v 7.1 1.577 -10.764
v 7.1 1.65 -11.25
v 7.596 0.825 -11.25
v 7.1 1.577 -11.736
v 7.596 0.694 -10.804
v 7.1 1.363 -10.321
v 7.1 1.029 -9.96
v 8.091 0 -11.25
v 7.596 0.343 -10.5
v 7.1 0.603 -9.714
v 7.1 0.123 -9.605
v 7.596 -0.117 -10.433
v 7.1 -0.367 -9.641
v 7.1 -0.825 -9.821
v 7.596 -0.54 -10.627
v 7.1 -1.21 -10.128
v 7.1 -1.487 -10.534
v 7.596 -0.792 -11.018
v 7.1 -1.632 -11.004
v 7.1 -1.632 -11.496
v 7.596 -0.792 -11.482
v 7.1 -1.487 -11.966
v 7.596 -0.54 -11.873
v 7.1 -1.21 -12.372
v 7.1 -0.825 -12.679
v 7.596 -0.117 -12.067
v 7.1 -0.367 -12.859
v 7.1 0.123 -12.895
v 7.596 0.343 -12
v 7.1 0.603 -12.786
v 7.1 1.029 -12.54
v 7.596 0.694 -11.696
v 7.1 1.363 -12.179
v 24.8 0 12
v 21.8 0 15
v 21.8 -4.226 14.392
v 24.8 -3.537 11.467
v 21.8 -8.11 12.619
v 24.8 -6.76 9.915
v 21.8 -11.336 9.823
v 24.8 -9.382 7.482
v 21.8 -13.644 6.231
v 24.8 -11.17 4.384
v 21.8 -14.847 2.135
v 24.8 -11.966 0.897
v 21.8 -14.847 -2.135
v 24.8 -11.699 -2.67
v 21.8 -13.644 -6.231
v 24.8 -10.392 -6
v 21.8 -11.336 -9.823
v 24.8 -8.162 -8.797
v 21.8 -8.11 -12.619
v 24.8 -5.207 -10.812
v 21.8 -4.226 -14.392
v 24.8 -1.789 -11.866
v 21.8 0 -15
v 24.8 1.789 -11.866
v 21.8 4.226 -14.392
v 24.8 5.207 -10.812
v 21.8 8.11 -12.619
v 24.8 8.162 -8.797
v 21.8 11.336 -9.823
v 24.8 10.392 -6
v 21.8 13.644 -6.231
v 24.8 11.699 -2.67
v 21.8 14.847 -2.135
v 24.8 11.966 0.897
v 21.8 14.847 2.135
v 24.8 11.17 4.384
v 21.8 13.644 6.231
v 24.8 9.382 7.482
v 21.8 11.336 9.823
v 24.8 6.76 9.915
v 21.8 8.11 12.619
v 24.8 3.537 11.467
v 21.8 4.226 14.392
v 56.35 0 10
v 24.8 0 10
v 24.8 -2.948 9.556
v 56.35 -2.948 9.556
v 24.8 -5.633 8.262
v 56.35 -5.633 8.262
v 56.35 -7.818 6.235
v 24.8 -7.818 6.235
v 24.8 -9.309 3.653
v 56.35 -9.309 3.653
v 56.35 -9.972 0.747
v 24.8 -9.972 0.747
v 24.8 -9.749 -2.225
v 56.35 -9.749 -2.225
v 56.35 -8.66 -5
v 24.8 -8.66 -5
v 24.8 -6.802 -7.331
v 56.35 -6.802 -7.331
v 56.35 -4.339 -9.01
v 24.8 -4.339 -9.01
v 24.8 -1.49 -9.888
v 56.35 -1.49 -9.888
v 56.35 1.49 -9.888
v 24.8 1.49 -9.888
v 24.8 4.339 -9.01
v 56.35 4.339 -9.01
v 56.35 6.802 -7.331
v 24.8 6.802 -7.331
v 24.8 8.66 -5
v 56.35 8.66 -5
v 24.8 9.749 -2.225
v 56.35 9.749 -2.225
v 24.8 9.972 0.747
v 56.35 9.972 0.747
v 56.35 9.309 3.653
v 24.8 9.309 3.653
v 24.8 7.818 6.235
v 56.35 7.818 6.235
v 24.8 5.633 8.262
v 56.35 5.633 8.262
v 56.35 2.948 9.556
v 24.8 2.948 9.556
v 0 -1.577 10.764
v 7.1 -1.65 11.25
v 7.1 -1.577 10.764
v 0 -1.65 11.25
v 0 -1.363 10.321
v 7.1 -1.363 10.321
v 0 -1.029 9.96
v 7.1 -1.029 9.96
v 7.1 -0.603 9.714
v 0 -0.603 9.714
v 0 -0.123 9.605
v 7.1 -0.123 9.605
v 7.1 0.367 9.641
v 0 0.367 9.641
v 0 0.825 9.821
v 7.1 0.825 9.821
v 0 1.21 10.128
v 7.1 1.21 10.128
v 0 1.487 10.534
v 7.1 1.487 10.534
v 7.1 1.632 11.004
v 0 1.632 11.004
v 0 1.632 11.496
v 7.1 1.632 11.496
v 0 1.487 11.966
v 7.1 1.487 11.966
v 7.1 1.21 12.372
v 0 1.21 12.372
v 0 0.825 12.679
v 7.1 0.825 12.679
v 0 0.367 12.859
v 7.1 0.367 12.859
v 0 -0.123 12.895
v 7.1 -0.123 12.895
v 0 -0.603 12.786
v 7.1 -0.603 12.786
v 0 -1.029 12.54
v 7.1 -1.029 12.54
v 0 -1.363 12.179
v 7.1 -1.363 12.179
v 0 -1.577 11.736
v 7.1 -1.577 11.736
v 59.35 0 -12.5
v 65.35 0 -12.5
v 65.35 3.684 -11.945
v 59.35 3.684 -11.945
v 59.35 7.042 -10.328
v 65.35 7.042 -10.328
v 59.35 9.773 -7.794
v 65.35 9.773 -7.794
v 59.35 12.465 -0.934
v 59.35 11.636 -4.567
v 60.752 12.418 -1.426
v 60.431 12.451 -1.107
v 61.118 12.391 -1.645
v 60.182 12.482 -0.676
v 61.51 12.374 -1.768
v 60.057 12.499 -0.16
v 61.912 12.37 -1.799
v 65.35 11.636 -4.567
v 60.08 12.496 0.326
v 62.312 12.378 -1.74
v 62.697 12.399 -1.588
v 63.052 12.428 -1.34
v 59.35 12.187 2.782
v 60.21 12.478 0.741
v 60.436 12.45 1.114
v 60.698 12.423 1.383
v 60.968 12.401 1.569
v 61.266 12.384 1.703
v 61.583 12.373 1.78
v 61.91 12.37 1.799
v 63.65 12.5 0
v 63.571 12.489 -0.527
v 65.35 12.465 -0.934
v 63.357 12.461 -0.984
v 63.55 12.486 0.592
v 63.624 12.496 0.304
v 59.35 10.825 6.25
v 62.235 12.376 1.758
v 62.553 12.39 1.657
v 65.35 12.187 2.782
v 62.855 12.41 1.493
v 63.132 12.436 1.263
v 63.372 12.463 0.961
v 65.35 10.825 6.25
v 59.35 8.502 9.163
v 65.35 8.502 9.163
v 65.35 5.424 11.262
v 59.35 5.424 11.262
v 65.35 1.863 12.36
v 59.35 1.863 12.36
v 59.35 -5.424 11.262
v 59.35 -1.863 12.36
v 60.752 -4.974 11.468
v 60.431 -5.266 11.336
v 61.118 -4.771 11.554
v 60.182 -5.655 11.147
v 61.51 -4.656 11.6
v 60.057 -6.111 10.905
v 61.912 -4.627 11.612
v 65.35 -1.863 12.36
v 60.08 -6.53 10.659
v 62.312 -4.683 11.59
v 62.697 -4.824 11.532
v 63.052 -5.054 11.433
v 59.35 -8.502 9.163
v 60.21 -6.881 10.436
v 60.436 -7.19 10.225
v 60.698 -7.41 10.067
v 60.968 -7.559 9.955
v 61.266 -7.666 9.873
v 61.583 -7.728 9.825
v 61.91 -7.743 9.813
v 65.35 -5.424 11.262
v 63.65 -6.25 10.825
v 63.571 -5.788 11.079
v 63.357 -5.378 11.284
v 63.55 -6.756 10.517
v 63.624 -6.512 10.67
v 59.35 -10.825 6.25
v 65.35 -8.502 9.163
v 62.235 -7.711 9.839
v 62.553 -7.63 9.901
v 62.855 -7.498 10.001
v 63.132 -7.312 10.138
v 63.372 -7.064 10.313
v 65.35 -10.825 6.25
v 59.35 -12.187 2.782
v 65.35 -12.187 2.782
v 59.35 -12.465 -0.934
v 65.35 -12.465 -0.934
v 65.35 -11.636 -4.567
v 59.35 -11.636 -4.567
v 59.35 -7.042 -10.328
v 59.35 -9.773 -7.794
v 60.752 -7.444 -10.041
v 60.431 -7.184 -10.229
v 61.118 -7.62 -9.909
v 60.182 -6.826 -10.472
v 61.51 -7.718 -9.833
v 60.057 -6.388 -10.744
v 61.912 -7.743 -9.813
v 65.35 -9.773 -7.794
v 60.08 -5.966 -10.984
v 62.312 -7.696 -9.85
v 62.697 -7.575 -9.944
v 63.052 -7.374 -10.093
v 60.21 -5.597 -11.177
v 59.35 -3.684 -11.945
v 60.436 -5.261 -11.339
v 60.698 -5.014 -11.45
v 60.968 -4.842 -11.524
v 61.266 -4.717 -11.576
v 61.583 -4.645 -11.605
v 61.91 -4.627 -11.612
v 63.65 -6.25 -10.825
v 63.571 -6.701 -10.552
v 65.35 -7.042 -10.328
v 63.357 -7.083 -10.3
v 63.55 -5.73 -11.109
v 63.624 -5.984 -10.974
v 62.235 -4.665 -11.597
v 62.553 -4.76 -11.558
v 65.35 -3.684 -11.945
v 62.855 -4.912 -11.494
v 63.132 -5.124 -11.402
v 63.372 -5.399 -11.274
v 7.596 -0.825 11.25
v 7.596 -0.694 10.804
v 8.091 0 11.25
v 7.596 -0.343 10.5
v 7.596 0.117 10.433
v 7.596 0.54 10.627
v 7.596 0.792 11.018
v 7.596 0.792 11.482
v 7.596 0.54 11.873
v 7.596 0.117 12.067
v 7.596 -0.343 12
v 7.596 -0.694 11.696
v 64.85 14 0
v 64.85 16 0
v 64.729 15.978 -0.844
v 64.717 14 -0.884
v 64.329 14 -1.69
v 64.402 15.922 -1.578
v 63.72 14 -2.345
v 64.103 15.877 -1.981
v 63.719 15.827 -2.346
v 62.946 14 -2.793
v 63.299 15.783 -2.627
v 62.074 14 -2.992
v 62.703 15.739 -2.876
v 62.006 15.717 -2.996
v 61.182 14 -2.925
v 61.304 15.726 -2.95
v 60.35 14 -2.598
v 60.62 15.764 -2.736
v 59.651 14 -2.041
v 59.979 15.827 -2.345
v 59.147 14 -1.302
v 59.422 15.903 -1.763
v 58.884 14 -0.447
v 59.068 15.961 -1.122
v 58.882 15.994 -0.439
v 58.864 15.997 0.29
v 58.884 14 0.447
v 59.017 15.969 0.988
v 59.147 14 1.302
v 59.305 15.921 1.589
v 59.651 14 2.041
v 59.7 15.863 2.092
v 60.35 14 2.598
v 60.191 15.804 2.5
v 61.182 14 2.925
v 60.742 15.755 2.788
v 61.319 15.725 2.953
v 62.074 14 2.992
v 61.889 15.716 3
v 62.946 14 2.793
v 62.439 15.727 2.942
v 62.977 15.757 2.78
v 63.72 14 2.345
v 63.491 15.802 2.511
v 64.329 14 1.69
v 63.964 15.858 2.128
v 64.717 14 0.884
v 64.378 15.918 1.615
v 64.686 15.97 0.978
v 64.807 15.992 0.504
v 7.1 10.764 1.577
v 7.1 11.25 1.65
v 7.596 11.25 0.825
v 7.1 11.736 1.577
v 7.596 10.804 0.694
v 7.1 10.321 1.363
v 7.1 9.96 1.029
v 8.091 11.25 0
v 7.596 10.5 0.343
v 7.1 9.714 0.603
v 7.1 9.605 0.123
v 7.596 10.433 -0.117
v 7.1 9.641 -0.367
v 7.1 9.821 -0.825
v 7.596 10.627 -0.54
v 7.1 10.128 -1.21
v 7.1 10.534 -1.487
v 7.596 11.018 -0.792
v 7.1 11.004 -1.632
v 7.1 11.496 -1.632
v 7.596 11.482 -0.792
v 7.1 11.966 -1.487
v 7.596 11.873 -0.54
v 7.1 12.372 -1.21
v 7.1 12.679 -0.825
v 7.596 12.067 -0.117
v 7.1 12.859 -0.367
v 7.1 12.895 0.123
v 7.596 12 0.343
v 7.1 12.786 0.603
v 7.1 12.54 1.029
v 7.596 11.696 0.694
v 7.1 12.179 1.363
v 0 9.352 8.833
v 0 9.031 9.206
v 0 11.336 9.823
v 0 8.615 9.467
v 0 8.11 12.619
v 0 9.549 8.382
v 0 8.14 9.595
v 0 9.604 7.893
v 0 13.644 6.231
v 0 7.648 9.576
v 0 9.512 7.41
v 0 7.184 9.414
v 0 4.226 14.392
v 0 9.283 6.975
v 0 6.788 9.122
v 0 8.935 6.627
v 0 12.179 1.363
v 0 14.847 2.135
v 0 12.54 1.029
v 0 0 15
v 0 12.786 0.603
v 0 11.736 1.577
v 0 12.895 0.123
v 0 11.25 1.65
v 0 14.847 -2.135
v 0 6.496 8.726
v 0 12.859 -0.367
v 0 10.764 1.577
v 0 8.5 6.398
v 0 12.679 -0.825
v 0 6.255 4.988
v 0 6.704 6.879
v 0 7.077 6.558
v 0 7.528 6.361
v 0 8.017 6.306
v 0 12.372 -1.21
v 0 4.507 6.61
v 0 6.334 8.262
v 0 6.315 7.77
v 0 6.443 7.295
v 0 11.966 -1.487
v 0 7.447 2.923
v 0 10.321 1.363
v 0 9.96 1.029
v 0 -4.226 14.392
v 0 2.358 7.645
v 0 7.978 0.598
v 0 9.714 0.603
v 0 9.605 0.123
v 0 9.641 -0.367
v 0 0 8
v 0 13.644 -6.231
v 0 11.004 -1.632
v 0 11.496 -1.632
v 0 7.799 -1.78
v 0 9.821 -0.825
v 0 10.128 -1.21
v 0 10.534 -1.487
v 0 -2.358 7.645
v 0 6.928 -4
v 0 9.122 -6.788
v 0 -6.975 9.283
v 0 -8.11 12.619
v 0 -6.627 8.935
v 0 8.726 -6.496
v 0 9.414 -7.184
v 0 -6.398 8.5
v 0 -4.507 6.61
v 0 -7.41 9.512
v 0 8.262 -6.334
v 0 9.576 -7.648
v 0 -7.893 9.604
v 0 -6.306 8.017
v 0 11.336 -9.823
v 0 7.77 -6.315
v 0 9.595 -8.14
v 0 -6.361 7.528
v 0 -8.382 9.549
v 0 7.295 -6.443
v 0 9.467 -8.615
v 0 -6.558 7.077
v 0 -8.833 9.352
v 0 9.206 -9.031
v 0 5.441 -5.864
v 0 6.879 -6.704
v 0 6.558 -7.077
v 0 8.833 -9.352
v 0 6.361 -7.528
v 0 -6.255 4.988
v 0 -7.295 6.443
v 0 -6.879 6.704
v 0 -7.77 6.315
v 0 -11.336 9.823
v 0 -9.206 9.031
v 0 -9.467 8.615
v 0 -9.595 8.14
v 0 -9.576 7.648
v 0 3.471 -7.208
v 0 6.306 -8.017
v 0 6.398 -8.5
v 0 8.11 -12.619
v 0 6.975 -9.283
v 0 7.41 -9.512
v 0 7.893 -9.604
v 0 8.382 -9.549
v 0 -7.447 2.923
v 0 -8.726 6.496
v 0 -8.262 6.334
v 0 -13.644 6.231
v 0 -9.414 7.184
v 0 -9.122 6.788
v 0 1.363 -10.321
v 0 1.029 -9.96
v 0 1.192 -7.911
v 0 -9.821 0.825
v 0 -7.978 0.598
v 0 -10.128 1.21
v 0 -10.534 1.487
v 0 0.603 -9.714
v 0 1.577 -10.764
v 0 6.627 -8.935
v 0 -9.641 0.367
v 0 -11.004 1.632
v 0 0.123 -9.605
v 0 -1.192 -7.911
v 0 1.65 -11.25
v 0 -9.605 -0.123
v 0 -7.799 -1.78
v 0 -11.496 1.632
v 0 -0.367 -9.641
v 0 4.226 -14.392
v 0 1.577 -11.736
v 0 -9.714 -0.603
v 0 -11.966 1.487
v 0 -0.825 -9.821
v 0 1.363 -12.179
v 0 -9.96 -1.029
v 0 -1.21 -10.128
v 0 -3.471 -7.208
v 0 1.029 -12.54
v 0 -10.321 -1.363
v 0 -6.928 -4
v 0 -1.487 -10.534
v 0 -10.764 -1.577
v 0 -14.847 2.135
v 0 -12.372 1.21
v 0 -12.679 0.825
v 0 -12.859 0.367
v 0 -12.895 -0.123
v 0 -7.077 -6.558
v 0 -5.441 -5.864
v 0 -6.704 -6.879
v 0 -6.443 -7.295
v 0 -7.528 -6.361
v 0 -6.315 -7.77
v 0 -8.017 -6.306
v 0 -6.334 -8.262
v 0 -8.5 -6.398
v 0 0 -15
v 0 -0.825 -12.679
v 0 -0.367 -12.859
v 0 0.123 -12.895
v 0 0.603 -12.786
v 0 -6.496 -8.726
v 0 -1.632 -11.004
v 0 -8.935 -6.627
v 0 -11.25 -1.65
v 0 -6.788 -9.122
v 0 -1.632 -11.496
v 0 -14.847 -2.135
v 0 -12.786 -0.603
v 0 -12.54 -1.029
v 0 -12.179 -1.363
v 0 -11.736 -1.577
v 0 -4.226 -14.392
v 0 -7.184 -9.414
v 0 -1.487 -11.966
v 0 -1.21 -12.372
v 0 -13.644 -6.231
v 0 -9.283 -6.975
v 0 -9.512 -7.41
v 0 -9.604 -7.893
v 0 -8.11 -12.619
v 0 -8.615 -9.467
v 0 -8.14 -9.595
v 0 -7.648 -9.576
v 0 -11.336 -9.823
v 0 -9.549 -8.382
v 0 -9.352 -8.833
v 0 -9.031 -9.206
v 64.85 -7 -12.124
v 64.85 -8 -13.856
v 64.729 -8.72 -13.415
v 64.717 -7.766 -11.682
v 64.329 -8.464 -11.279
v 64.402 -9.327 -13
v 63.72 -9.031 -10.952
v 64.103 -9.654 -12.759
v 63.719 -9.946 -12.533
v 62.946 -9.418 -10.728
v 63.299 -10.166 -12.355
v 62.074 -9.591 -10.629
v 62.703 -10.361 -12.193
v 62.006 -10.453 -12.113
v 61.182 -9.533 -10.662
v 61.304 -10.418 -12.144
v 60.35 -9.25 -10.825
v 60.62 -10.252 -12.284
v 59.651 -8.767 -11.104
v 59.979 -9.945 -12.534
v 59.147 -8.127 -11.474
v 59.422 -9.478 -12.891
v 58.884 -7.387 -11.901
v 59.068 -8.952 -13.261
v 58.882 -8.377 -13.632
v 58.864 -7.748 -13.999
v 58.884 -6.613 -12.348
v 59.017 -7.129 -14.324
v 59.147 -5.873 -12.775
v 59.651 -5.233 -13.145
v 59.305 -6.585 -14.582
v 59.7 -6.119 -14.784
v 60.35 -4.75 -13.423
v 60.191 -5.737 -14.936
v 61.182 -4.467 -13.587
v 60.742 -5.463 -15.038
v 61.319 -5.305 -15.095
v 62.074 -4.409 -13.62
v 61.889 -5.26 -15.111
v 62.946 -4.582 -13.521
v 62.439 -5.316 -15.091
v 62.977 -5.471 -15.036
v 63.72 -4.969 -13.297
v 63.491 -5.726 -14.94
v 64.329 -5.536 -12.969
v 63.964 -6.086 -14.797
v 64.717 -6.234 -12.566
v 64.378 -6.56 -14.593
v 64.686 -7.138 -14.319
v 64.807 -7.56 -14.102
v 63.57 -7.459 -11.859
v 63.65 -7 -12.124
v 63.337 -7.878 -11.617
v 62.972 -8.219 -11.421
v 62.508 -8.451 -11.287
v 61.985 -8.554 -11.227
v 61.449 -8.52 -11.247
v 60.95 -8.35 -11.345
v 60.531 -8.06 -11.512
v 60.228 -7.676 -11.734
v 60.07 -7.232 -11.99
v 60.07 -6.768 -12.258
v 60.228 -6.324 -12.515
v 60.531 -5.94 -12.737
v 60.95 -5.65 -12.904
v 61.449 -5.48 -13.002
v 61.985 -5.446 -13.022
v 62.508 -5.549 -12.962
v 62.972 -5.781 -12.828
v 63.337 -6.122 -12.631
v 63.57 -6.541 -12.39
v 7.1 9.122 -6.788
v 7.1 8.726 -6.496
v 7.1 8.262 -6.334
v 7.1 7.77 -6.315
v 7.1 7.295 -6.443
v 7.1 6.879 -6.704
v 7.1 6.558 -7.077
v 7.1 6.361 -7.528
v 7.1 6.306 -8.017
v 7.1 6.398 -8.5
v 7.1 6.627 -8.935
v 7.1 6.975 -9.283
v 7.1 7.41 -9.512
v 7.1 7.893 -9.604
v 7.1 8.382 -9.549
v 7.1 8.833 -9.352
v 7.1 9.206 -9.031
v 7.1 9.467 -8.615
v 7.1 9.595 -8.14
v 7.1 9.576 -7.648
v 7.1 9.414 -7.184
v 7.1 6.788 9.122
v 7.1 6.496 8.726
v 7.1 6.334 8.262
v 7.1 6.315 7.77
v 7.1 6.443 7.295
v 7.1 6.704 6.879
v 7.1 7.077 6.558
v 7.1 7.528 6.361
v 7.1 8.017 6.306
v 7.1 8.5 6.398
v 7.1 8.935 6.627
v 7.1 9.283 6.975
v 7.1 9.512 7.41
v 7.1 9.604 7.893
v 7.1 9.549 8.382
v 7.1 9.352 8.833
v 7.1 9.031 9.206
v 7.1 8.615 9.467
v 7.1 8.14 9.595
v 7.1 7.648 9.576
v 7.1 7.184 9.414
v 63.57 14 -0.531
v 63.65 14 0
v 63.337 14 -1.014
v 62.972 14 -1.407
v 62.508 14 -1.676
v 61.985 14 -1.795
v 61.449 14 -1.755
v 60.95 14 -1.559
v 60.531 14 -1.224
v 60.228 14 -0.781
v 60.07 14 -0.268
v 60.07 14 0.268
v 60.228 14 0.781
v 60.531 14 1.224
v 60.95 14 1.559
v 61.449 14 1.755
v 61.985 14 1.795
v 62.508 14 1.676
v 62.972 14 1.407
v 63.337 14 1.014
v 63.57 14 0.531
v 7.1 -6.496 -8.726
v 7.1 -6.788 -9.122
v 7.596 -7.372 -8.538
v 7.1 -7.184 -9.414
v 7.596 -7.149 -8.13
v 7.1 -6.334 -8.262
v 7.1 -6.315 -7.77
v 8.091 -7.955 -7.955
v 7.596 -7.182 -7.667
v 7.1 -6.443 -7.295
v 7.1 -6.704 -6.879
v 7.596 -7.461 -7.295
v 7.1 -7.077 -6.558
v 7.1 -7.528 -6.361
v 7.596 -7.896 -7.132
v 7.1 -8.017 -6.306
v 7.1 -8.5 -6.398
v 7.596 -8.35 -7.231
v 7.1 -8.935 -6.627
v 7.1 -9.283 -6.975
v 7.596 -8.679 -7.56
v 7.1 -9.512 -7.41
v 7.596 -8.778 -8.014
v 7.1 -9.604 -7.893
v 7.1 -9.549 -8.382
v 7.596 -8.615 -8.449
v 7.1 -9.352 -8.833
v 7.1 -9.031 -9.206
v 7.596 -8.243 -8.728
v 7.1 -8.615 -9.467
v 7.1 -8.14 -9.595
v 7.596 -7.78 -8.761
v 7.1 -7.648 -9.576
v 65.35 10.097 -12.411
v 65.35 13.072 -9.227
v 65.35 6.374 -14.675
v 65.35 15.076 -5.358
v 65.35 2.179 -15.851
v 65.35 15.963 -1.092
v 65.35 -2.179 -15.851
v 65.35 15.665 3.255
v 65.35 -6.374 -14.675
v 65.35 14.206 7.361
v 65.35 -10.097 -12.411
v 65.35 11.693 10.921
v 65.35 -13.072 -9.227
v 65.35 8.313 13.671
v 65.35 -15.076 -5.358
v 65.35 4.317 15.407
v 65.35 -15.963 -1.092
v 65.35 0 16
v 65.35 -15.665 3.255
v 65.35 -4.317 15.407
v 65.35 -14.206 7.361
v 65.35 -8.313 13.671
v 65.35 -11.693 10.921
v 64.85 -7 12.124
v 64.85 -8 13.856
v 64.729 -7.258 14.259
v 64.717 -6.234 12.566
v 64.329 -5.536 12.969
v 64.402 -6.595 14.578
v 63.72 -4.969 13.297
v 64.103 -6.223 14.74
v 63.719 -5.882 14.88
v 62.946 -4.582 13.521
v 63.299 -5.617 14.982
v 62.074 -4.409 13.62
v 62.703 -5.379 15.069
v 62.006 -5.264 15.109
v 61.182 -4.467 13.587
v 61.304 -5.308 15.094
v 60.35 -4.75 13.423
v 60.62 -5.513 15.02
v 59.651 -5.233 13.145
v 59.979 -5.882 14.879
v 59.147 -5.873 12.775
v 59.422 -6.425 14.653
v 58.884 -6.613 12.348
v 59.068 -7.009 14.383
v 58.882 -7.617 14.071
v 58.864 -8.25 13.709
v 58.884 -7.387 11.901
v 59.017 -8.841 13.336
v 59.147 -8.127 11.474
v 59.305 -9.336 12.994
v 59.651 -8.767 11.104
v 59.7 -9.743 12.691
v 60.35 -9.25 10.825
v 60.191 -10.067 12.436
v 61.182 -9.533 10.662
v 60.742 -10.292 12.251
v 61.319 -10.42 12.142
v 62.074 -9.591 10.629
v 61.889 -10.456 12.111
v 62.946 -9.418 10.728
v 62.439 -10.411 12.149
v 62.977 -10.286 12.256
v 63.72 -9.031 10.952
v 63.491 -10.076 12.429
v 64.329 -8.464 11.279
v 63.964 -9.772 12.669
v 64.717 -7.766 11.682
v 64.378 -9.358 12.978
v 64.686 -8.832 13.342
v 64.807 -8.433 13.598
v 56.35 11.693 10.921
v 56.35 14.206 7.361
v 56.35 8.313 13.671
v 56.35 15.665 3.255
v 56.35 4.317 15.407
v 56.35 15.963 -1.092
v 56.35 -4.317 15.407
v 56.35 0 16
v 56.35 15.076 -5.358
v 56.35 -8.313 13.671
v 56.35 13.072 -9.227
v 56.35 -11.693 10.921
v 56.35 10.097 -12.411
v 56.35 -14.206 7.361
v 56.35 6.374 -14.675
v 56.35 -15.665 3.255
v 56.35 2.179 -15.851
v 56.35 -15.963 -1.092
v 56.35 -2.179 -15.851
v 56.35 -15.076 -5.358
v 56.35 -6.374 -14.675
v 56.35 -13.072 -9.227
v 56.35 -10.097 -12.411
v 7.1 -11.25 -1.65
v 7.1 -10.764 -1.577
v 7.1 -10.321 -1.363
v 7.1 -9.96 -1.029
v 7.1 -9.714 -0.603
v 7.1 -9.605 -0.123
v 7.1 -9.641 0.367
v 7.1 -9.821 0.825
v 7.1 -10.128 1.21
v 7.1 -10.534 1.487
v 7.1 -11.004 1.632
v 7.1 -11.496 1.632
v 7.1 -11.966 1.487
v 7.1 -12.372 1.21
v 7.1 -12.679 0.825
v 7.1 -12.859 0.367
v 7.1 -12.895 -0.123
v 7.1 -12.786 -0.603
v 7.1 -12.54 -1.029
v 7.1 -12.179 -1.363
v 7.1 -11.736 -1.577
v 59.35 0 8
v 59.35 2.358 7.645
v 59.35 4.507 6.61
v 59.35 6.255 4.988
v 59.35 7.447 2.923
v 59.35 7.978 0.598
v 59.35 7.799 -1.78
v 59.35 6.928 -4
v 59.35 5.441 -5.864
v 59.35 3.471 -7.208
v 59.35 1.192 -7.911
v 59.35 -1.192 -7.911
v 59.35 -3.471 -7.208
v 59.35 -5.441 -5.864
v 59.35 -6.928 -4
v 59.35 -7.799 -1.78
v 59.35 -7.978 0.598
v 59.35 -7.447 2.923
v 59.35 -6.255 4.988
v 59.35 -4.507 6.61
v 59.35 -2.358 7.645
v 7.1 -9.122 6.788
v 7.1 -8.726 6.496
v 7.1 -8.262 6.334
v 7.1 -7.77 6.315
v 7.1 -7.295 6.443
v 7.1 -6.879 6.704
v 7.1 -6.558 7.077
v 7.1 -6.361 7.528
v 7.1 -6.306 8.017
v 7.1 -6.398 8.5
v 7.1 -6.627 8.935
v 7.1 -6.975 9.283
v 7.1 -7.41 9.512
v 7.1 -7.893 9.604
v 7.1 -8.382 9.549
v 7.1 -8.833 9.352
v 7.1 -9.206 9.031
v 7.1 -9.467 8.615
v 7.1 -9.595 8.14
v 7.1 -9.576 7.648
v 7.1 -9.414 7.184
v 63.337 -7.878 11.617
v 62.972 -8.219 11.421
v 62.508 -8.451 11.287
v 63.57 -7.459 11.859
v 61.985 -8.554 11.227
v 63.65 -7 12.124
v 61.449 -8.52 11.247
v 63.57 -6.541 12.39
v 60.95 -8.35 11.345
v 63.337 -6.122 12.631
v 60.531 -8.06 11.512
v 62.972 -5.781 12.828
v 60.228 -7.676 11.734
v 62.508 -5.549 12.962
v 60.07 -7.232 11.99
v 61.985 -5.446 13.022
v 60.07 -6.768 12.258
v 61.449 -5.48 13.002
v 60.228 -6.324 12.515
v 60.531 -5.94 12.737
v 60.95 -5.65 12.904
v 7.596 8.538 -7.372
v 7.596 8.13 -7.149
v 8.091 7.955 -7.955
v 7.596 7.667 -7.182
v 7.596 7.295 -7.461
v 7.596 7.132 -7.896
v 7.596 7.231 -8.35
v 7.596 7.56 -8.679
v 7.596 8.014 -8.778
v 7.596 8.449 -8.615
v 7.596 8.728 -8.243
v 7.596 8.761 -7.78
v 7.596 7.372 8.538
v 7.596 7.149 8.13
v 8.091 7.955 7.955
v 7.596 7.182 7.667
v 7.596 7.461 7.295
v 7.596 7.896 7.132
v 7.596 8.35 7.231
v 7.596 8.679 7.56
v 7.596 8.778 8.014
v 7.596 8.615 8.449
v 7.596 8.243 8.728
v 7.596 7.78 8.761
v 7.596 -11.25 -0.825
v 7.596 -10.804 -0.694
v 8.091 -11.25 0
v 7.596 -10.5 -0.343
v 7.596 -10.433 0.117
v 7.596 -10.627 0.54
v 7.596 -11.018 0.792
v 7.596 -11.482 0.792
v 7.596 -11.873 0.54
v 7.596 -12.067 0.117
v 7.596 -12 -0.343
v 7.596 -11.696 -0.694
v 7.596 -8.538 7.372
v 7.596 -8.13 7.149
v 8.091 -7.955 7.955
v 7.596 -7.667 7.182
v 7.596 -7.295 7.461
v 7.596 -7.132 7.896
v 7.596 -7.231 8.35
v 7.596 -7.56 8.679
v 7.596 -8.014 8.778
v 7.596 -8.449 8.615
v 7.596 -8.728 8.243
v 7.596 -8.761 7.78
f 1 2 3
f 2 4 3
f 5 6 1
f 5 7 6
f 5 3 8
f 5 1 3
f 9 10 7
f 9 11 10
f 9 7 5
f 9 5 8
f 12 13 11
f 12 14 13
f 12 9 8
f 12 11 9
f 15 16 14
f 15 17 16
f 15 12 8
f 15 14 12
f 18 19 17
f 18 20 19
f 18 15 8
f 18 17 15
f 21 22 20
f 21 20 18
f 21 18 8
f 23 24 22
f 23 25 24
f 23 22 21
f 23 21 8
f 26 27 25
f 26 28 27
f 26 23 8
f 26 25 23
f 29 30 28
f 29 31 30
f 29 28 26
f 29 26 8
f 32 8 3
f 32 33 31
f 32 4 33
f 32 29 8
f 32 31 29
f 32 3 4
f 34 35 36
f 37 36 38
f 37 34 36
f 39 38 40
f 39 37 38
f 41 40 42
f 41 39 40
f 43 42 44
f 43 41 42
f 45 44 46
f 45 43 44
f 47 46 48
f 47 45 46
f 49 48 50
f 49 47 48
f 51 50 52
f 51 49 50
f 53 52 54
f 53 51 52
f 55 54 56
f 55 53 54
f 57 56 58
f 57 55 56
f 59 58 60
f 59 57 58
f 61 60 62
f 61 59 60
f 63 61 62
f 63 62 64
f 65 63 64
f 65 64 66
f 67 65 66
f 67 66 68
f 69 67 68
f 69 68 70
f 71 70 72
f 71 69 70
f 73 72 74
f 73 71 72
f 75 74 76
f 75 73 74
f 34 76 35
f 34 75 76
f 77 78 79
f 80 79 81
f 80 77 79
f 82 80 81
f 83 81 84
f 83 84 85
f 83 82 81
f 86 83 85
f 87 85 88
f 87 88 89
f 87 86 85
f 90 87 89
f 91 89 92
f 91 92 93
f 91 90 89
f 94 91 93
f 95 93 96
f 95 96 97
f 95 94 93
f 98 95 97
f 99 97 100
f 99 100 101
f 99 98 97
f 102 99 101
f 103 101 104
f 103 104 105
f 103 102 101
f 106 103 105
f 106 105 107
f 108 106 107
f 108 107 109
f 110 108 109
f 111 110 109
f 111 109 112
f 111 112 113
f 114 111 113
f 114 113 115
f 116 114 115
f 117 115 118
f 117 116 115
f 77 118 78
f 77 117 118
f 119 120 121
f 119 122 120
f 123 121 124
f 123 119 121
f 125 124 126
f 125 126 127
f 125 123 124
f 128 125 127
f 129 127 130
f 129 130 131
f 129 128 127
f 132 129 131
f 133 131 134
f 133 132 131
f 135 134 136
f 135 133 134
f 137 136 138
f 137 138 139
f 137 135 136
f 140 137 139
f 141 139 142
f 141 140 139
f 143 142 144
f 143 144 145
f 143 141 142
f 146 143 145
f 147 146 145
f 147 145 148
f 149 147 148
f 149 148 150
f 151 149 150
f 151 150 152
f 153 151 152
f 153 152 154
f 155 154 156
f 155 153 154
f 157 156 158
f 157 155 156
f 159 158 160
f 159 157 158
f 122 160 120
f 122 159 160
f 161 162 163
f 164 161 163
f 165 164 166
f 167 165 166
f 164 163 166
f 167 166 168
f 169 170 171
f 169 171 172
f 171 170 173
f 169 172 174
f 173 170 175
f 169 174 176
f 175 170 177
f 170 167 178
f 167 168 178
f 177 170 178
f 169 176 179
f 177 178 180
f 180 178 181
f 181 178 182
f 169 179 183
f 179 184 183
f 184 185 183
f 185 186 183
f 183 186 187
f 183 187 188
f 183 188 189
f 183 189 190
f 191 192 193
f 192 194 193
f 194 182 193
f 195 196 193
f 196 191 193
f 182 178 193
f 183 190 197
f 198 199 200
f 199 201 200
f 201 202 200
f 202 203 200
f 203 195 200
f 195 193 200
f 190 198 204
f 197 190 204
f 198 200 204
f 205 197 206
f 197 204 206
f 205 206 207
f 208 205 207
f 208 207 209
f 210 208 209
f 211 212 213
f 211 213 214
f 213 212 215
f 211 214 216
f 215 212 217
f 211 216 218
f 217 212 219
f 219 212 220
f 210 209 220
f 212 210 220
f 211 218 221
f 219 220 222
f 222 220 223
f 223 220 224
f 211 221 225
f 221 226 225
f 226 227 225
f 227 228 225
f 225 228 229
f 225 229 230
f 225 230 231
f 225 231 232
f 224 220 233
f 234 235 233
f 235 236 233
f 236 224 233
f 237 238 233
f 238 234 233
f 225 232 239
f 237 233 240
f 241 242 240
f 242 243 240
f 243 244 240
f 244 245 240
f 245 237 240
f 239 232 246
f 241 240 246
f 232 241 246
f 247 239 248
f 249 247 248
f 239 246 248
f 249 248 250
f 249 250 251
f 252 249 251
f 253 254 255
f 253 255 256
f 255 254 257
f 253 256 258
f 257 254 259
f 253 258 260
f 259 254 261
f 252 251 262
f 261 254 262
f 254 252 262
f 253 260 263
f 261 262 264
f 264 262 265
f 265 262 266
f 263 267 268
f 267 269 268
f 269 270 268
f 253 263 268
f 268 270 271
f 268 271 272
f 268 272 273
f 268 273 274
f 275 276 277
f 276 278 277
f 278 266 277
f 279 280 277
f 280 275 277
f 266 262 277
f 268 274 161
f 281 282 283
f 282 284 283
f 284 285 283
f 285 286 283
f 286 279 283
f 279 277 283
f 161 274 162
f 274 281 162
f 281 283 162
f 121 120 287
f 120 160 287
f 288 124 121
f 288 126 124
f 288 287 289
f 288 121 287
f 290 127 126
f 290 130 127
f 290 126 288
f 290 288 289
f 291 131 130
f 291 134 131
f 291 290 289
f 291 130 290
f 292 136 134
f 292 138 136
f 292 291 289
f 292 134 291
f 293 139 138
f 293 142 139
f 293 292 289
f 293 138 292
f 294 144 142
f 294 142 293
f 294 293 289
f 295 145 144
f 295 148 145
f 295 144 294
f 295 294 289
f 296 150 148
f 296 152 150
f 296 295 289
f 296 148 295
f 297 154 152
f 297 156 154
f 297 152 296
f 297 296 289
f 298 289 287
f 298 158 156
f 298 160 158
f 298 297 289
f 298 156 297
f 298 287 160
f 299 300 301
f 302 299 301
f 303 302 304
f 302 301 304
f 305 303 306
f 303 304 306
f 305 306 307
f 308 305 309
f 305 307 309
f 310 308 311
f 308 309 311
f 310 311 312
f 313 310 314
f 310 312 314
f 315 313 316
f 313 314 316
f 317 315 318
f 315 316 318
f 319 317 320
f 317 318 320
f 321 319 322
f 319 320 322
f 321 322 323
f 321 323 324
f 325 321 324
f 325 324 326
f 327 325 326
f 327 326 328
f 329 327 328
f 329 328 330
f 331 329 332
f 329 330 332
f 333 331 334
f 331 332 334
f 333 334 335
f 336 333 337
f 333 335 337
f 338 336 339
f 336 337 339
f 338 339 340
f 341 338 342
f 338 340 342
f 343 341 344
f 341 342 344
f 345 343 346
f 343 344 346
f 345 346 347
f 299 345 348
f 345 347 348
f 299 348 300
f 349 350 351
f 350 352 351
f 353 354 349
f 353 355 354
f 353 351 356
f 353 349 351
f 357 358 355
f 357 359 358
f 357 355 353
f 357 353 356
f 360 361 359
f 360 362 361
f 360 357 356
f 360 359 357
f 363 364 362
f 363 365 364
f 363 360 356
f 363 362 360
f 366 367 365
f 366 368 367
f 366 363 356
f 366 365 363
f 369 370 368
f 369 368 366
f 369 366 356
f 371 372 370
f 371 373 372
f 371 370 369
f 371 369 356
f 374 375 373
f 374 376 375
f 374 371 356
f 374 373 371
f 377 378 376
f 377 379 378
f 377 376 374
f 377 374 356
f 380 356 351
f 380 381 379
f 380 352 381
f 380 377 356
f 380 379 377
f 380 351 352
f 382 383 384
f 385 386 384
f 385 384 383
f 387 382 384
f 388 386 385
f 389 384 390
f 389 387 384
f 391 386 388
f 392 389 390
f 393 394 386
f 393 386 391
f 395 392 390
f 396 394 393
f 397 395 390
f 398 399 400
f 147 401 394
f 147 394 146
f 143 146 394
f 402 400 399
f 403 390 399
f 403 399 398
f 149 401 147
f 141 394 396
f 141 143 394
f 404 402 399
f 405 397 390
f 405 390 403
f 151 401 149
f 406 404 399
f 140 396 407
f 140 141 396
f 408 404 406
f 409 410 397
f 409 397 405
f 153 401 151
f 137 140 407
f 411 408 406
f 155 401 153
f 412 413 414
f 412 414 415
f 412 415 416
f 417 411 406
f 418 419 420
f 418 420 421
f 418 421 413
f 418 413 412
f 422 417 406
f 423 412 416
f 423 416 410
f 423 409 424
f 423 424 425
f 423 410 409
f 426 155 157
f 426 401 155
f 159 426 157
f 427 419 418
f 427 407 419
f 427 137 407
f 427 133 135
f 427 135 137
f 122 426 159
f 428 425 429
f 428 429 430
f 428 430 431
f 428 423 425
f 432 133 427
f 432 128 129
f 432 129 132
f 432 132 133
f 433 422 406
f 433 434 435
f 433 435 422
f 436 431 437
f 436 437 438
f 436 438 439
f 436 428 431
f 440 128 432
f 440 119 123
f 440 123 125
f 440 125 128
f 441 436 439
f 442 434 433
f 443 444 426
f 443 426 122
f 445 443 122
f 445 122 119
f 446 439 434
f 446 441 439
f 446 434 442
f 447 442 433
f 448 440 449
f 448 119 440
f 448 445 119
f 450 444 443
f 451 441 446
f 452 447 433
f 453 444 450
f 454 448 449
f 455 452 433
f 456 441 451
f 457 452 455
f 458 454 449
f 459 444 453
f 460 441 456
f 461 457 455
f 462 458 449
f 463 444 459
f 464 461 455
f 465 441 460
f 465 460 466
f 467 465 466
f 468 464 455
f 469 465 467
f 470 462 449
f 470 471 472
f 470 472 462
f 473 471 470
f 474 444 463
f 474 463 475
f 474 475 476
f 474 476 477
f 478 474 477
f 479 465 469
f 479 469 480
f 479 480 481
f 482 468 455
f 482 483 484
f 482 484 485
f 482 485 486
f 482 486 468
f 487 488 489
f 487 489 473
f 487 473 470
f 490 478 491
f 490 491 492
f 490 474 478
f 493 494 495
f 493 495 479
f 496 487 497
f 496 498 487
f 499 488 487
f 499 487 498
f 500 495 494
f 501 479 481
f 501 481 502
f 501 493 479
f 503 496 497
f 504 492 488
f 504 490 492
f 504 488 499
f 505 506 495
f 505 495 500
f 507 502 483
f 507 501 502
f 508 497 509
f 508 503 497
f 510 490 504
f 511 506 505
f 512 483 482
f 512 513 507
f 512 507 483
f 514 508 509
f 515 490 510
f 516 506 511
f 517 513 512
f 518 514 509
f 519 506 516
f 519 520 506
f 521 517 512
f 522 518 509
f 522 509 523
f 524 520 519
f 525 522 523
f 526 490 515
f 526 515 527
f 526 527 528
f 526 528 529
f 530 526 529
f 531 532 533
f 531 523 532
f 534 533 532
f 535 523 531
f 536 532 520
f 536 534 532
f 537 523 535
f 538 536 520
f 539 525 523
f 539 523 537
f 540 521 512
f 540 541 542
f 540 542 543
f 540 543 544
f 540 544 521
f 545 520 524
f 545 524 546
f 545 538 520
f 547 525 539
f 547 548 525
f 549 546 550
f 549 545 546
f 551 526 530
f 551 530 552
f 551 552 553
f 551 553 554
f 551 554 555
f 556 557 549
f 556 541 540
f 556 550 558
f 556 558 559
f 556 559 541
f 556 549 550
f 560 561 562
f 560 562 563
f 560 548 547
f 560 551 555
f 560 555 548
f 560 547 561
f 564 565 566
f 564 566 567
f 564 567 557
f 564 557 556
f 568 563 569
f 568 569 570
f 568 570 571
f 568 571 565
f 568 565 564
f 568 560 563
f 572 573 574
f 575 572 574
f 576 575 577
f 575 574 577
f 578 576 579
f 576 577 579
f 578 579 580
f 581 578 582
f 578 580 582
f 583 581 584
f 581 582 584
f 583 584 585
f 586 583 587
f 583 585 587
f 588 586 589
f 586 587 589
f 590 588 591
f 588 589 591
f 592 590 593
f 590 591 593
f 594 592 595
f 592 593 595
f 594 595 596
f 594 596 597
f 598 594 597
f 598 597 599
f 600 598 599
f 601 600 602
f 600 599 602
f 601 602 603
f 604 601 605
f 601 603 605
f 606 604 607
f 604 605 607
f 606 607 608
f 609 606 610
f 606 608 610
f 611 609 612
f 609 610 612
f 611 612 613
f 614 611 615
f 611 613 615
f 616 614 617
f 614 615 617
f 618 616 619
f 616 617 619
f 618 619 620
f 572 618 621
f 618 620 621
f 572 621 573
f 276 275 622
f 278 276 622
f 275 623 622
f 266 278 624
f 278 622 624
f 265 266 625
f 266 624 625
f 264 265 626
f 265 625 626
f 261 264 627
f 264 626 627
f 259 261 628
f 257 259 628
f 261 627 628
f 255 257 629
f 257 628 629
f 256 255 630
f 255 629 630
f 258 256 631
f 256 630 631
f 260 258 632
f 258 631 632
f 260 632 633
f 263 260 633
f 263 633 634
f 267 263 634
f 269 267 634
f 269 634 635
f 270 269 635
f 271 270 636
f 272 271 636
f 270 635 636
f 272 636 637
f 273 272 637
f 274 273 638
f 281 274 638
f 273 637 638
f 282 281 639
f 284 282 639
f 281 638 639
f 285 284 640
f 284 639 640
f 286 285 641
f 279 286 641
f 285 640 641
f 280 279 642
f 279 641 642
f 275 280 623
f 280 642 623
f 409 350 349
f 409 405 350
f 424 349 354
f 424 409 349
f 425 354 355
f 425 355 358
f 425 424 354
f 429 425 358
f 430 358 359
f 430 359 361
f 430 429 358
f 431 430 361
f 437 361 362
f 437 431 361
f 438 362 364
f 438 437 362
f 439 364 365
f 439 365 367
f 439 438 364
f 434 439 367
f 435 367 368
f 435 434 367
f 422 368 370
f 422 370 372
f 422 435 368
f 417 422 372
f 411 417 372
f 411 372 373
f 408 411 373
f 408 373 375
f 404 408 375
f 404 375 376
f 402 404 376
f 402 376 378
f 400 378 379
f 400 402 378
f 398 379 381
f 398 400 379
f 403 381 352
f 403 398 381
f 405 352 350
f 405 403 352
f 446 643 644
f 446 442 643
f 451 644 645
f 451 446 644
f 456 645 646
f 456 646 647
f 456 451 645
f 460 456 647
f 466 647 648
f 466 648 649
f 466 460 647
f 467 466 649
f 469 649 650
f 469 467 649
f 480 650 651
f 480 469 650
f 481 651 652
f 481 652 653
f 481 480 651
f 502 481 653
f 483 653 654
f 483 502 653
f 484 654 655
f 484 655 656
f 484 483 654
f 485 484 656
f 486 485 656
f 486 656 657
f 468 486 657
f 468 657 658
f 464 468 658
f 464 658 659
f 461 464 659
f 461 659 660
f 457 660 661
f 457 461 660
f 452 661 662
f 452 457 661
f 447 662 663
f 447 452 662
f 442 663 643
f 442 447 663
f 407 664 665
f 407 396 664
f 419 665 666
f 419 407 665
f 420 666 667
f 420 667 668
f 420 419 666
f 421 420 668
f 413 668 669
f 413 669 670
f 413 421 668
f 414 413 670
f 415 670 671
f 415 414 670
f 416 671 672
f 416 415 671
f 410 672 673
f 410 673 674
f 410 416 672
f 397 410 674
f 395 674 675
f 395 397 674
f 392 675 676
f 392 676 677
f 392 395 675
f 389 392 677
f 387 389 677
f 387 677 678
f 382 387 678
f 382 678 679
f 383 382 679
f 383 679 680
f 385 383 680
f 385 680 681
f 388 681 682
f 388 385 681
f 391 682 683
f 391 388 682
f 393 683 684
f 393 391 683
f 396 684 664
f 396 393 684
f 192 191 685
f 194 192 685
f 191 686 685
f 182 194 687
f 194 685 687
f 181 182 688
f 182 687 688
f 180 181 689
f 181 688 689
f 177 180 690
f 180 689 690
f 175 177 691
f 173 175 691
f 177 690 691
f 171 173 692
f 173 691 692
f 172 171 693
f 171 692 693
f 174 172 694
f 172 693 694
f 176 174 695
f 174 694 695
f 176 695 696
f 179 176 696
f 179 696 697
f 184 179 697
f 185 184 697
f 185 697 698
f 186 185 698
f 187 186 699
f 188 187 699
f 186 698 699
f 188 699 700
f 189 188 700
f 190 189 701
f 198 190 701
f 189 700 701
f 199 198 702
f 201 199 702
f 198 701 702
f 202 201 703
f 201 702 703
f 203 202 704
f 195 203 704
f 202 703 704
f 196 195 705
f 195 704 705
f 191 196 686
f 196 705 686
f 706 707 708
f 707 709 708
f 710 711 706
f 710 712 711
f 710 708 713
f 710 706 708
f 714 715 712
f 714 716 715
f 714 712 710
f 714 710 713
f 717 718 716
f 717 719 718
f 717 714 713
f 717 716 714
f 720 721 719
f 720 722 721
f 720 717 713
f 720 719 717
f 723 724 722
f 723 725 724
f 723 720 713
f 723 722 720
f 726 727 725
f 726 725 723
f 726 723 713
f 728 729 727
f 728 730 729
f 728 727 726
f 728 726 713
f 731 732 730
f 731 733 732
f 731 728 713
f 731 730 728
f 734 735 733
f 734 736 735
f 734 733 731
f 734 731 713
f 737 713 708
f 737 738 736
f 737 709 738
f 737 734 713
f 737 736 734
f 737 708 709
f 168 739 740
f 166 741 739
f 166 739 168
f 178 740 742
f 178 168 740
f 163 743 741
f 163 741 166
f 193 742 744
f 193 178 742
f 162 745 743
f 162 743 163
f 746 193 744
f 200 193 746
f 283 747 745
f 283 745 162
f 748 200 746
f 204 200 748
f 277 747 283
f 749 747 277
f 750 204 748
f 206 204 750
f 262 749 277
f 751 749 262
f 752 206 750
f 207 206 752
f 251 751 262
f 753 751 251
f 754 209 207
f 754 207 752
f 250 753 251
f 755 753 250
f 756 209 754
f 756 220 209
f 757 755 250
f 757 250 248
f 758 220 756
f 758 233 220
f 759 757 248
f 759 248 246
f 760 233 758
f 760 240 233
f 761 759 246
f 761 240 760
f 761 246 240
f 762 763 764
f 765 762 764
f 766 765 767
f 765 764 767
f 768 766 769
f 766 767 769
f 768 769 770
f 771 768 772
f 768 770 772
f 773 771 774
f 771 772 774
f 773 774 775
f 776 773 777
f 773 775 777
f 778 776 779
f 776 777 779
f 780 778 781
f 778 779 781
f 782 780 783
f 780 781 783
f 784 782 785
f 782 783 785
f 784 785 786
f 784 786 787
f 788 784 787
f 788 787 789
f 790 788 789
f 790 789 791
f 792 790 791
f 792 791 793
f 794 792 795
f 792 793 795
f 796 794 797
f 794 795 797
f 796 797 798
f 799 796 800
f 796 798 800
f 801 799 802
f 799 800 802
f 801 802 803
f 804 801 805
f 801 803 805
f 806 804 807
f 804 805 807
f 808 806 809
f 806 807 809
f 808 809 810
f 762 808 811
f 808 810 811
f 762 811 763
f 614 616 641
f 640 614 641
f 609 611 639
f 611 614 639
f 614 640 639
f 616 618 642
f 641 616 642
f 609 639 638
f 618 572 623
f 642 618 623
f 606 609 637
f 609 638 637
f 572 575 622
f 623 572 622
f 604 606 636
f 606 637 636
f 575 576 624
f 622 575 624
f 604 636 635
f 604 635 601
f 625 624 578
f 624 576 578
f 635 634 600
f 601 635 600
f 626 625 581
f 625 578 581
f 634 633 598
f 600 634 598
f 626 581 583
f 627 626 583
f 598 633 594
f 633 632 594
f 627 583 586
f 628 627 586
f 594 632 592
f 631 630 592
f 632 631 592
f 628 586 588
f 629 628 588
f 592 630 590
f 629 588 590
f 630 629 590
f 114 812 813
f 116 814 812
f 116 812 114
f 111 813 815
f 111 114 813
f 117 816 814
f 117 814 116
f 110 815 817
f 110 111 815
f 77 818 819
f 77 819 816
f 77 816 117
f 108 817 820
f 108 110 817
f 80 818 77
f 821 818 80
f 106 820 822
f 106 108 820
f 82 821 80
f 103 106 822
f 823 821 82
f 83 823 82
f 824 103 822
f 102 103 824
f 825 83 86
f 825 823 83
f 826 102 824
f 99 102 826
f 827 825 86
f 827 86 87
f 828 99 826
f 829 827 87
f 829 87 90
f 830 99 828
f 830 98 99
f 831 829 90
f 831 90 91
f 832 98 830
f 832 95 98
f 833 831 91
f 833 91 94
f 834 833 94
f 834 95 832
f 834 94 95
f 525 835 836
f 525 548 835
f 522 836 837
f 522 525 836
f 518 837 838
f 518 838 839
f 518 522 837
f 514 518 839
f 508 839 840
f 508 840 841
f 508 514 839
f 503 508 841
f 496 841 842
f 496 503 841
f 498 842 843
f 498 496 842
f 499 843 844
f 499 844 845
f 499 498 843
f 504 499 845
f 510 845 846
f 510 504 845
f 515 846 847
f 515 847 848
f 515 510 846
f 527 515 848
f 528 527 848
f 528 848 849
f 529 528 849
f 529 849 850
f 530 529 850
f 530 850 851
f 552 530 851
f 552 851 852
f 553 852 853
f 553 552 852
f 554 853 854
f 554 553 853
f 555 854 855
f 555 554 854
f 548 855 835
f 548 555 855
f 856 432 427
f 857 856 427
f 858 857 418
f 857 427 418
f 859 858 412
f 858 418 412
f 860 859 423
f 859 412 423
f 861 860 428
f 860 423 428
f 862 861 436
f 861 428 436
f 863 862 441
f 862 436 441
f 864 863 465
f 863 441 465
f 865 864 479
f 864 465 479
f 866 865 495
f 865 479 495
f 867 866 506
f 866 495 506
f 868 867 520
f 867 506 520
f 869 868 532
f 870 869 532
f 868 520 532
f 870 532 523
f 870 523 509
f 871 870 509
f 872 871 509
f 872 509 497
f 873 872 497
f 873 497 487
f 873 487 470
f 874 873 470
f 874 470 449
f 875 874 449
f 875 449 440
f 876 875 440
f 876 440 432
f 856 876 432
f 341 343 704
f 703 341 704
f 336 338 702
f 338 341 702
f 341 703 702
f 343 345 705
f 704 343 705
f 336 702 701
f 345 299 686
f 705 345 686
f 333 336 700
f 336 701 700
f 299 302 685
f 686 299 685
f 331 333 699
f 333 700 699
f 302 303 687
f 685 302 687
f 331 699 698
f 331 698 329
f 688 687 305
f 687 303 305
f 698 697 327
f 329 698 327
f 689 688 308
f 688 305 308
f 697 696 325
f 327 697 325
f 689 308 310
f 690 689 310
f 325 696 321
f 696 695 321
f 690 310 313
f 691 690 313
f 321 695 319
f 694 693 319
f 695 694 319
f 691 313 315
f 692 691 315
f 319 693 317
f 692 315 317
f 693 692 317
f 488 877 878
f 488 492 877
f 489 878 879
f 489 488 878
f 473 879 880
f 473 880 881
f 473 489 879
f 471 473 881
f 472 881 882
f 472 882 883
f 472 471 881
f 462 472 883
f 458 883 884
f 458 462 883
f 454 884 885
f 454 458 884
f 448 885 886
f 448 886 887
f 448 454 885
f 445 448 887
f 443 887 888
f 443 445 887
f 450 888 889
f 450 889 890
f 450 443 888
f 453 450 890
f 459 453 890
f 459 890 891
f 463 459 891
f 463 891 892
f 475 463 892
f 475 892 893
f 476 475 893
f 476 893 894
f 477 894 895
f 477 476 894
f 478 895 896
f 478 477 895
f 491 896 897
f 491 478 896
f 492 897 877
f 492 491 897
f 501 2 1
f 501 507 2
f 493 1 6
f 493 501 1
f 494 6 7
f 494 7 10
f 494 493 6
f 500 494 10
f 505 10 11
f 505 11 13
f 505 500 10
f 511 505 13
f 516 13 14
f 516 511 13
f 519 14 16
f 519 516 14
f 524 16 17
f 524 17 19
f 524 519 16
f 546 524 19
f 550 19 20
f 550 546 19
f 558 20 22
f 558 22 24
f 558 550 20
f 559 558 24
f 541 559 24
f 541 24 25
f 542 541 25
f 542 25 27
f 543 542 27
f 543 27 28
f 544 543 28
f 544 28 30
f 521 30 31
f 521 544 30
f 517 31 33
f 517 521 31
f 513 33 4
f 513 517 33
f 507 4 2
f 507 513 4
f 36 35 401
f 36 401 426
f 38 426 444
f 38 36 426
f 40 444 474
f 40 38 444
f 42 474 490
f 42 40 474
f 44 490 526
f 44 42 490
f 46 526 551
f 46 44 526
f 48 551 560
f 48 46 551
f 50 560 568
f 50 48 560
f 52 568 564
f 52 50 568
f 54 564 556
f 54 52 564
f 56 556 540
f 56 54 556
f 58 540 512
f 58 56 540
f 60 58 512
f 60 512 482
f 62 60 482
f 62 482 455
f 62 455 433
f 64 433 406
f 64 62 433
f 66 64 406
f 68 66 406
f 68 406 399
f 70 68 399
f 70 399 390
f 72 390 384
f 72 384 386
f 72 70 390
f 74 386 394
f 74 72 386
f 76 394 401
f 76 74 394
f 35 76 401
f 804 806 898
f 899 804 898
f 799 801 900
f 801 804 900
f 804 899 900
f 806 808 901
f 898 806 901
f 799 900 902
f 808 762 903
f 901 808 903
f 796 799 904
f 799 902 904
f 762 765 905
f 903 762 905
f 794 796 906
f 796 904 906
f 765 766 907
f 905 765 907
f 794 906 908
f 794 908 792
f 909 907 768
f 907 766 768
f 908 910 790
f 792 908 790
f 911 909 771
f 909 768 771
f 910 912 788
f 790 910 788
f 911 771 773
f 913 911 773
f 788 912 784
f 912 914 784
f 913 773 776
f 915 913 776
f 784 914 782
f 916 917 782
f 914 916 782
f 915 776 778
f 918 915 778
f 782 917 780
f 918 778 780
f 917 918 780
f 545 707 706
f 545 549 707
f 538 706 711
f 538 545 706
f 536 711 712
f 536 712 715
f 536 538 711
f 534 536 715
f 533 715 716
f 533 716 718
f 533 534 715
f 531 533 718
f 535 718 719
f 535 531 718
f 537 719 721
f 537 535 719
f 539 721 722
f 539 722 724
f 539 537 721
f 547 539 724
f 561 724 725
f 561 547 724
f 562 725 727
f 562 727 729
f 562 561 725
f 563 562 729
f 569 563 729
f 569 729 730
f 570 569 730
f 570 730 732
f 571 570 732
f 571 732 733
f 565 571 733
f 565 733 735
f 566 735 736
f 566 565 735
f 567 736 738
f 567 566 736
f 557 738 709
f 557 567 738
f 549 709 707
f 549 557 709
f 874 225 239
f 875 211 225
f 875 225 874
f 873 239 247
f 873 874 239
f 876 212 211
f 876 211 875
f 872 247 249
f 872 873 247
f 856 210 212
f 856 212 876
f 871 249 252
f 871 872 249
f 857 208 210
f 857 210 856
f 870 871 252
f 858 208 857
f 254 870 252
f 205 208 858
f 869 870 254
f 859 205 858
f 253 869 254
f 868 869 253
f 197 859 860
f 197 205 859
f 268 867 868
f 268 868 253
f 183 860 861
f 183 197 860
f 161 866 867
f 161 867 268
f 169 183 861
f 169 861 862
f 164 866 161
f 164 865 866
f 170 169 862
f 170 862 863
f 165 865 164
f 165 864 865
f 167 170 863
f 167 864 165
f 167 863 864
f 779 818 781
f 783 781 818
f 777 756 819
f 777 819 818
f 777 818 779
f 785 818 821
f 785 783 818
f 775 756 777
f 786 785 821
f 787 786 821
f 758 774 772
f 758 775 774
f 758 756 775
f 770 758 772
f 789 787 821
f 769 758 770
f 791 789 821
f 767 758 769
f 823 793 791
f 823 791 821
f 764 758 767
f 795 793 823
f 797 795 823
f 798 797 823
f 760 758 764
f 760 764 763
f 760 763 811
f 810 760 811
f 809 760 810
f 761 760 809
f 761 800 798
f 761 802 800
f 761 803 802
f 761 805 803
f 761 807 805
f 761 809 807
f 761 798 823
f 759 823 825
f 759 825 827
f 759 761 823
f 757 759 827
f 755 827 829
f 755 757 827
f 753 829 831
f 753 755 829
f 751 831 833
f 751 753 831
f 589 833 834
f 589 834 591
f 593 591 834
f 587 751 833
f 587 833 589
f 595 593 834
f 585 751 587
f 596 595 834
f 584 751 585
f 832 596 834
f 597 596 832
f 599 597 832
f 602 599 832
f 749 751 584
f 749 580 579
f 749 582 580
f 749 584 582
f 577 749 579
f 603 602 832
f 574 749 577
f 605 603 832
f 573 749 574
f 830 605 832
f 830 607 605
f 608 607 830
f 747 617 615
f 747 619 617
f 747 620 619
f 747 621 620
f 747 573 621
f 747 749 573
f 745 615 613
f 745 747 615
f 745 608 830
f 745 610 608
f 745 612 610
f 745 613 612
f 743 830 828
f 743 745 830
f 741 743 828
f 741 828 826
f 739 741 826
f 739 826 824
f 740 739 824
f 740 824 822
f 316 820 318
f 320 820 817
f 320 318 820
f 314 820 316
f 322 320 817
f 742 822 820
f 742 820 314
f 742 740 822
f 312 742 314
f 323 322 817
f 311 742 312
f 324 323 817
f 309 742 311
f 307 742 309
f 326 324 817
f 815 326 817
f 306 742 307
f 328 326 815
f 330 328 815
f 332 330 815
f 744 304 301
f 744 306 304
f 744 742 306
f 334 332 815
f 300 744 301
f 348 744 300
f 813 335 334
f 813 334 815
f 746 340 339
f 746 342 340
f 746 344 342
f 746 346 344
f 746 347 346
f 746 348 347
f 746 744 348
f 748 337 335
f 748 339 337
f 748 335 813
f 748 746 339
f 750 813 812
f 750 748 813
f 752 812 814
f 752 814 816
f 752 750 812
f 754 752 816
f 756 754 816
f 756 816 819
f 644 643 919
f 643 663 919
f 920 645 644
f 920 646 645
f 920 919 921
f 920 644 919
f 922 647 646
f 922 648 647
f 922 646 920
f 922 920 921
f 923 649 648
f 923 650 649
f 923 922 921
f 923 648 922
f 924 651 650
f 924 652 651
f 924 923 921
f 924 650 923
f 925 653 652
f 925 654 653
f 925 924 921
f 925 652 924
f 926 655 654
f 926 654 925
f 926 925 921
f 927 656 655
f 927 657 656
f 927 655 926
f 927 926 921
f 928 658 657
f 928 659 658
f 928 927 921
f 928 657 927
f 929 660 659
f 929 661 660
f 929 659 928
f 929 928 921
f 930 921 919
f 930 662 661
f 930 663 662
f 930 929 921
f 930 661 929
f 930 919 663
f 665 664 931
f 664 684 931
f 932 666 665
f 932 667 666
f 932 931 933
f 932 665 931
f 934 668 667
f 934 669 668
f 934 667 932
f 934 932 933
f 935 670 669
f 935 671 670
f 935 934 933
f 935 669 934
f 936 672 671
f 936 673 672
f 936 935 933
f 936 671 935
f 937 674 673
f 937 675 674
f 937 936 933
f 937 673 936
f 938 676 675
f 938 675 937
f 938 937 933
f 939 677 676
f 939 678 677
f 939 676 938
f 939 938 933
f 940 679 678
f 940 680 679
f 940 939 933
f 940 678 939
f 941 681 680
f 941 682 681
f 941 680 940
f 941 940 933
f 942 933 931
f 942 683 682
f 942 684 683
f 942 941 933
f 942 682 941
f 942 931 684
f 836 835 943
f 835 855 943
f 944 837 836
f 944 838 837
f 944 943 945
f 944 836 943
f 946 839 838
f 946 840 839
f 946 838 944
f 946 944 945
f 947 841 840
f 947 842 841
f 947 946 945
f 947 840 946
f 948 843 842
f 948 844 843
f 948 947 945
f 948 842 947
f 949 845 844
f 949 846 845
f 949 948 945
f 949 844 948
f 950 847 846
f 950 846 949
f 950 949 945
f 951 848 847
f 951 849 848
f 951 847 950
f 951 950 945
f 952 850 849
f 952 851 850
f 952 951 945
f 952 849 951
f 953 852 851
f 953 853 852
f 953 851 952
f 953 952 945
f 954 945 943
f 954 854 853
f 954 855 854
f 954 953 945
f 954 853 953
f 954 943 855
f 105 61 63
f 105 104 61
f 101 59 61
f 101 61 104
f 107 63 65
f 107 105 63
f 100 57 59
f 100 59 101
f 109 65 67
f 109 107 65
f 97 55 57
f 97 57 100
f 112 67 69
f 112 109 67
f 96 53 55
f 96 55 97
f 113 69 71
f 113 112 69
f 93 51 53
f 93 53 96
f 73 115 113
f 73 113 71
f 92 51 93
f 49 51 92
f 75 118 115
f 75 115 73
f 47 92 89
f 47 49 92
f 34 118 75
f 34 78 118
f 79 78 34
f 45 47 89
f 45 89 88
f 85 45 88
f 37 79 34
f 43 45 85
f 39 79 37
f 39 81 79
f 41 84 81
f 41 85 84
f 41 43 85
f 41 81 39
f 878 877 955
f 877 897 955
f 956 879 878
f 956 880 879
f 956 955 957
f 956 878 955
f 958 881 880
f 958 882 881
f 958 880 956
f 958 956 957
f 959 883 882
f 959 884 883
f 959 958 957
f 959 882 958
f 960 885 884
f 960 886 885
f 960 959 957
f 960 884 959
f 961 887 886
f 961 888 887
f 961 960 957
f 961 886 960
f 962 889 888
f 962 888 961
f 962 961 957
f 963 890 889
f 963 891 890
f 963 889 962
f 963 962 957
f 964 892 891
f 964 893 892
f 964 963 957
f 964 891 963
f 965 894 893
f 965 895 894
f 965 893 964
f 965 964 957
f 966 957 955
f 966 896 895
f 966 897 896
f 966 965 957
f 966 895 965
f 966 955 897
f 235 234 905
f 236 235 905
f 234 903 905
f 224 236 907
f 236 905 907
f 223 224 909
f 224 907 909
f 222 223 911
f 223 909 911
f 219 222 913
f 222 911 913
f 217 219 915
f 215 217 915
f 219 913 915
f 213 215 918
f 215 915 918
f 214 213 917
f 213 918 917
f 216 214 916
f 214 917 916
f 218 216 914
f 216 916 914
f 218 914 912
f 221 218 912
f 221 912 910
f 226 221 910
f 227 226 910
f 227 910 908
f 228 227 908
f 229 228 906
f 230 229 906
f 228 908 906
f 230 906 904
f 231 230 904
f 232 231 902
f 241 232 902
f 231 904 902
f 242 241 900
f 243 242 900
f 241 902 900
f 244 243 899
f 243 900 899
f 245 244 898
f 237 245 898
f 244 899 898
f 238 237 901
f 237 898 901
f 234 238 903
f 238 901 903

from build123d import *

# Parameters (mm, degrees)
SKETCH_2_R               = 8
CUT_EXTRUDE_1_DEPTH      = 70.156507286
SKETCH_5_R               = 12.5
CUT_EXTRUDE_2_DEPTH      = 6
CHAMFER_1_SIZE           = 3
PATTERN_CIRCULAR_3_COUNT = 8
PATTERN_CIRCULAR_4_COUNT = 3


# Read off the part's stored shape, not the designer's step: 打孔尺寸(%根据)内六角圆柱头螺钉的类型1
with BuildPart() as part:
    # 草图1 → 旋转1 (revolve)
    with BuildSketch(Plane(origin=(0, 0, 0), x_dir=(1, 0, 0), z_dir=(0, 1, 0)), mode=Mode.PRIVATE) as revolve_1_sk:
        Polygon((0, 0), (0, 15), (24.8, 15), (24.8, 10), (56.35, 10), (56.35, 16), (65.35, 16), (65.35, 0), align=None)
    revolve(revolve_1_sk.sketch.rotate(Axis((-27.673469388, 0, 0), (1, 0, 0)), 180), axis=Axis((-27.673469388, 0, 0), (1, 0, 0)))

    # 草图2 → 切除-拉伸1 (cut, through all)
    with BuildSketch(Plane.ZY):
        Circle(SKETCH_2_R)
    extrude(amount=-CUT_EXTRUDE_1_DEPTH, mode=Mode.SUBTRACT)

    # 草图5 → 切除-拉伸2 (cut)
    with BuildSketch(Plane(origin=(65.35, 0, 0), x_dir=(0, 0, -1), z_dir=(1, 0, 0))):
        Circle(SKETCH_5_R)
    extrude(amount=-CUT_EXTRUDE_2_DEPTH, mode=Mode.SUBTRACT)

    # 倒角1
    chamfer_1_edges = [part.edges().sort_by_distance(p)[0] for p in [
        (24.8, 0, -15),
    ]]
    chamfer(chamfer_1_edges, length=CHAMFER_1_SIZE)

    # 草图11 → M4 螺纹孔1 (revolve, cut)
    with BuildSketch(Plane.ZX.offset(11.25)):
        Polygon((0, 0), (0, 8.091420021), (1.65, 7.1), (1.65, 0), align=None)
    hole_wizard_m4_1 = revolve(axis=Axis((-6.35, 11.25, 0), (1, 0, 0)), mode=Mode.SUBTRACT)

    # 阵列(圆周)3: M4 螺纹孔1 ×8 about axis
    pattern_circular_3_axis = Axis((0, 0, 0), (1, 0, 0))
    for i in range(1, PATTERN_CIRCULAR_3_COUNT):
        add(hole_wizard_m4_1.rotate(pattern_circular_3_axis, i * 360 / PATTERN_CIRCULAR_3_COUNT), mode=Mode.SUBTRACT)

    # 打孔尺寸(%根据)内六角圆柱头螺钉的类型1 outline → 打孔尺寸(%根据)内六角圆柱头螺钉的类型1 (revolve, cut)
    with BuildSketch(Plane(origin=(61.85, 0, 0), x_dir=(1, 0, 0), z_dir=(0, 0, 1))):
        Polygon((1.8, 14), (3, 14), (3, 16.000041716), (0, 16.000041716), (0, 12.369650157), (1.8, 12.369650157), align=None)
    hole_wizard_1 = revolve(axis=Axis((61.85, 0, 0), (0, 1, 0)), mode=Mode.SUBTRACT)

    # 阵列(圆周)4: 打孔尺寸(%根据)内六角圆柱头螺钉的类型1 ×3 about axis
    pattern_circular_4_axis = Axis((0, 0, 0), (1, 0, 0))
    for i in range(1, PATTERN_CIRCULAR_4_COUNT):
        add(hole_wizard_1.rotate(pattern_circular_4_axis, i * 360 / PATTERN_CIRCULAR_4_COUNT), mode=Mode.SUBTRACT)


solid = part.part
